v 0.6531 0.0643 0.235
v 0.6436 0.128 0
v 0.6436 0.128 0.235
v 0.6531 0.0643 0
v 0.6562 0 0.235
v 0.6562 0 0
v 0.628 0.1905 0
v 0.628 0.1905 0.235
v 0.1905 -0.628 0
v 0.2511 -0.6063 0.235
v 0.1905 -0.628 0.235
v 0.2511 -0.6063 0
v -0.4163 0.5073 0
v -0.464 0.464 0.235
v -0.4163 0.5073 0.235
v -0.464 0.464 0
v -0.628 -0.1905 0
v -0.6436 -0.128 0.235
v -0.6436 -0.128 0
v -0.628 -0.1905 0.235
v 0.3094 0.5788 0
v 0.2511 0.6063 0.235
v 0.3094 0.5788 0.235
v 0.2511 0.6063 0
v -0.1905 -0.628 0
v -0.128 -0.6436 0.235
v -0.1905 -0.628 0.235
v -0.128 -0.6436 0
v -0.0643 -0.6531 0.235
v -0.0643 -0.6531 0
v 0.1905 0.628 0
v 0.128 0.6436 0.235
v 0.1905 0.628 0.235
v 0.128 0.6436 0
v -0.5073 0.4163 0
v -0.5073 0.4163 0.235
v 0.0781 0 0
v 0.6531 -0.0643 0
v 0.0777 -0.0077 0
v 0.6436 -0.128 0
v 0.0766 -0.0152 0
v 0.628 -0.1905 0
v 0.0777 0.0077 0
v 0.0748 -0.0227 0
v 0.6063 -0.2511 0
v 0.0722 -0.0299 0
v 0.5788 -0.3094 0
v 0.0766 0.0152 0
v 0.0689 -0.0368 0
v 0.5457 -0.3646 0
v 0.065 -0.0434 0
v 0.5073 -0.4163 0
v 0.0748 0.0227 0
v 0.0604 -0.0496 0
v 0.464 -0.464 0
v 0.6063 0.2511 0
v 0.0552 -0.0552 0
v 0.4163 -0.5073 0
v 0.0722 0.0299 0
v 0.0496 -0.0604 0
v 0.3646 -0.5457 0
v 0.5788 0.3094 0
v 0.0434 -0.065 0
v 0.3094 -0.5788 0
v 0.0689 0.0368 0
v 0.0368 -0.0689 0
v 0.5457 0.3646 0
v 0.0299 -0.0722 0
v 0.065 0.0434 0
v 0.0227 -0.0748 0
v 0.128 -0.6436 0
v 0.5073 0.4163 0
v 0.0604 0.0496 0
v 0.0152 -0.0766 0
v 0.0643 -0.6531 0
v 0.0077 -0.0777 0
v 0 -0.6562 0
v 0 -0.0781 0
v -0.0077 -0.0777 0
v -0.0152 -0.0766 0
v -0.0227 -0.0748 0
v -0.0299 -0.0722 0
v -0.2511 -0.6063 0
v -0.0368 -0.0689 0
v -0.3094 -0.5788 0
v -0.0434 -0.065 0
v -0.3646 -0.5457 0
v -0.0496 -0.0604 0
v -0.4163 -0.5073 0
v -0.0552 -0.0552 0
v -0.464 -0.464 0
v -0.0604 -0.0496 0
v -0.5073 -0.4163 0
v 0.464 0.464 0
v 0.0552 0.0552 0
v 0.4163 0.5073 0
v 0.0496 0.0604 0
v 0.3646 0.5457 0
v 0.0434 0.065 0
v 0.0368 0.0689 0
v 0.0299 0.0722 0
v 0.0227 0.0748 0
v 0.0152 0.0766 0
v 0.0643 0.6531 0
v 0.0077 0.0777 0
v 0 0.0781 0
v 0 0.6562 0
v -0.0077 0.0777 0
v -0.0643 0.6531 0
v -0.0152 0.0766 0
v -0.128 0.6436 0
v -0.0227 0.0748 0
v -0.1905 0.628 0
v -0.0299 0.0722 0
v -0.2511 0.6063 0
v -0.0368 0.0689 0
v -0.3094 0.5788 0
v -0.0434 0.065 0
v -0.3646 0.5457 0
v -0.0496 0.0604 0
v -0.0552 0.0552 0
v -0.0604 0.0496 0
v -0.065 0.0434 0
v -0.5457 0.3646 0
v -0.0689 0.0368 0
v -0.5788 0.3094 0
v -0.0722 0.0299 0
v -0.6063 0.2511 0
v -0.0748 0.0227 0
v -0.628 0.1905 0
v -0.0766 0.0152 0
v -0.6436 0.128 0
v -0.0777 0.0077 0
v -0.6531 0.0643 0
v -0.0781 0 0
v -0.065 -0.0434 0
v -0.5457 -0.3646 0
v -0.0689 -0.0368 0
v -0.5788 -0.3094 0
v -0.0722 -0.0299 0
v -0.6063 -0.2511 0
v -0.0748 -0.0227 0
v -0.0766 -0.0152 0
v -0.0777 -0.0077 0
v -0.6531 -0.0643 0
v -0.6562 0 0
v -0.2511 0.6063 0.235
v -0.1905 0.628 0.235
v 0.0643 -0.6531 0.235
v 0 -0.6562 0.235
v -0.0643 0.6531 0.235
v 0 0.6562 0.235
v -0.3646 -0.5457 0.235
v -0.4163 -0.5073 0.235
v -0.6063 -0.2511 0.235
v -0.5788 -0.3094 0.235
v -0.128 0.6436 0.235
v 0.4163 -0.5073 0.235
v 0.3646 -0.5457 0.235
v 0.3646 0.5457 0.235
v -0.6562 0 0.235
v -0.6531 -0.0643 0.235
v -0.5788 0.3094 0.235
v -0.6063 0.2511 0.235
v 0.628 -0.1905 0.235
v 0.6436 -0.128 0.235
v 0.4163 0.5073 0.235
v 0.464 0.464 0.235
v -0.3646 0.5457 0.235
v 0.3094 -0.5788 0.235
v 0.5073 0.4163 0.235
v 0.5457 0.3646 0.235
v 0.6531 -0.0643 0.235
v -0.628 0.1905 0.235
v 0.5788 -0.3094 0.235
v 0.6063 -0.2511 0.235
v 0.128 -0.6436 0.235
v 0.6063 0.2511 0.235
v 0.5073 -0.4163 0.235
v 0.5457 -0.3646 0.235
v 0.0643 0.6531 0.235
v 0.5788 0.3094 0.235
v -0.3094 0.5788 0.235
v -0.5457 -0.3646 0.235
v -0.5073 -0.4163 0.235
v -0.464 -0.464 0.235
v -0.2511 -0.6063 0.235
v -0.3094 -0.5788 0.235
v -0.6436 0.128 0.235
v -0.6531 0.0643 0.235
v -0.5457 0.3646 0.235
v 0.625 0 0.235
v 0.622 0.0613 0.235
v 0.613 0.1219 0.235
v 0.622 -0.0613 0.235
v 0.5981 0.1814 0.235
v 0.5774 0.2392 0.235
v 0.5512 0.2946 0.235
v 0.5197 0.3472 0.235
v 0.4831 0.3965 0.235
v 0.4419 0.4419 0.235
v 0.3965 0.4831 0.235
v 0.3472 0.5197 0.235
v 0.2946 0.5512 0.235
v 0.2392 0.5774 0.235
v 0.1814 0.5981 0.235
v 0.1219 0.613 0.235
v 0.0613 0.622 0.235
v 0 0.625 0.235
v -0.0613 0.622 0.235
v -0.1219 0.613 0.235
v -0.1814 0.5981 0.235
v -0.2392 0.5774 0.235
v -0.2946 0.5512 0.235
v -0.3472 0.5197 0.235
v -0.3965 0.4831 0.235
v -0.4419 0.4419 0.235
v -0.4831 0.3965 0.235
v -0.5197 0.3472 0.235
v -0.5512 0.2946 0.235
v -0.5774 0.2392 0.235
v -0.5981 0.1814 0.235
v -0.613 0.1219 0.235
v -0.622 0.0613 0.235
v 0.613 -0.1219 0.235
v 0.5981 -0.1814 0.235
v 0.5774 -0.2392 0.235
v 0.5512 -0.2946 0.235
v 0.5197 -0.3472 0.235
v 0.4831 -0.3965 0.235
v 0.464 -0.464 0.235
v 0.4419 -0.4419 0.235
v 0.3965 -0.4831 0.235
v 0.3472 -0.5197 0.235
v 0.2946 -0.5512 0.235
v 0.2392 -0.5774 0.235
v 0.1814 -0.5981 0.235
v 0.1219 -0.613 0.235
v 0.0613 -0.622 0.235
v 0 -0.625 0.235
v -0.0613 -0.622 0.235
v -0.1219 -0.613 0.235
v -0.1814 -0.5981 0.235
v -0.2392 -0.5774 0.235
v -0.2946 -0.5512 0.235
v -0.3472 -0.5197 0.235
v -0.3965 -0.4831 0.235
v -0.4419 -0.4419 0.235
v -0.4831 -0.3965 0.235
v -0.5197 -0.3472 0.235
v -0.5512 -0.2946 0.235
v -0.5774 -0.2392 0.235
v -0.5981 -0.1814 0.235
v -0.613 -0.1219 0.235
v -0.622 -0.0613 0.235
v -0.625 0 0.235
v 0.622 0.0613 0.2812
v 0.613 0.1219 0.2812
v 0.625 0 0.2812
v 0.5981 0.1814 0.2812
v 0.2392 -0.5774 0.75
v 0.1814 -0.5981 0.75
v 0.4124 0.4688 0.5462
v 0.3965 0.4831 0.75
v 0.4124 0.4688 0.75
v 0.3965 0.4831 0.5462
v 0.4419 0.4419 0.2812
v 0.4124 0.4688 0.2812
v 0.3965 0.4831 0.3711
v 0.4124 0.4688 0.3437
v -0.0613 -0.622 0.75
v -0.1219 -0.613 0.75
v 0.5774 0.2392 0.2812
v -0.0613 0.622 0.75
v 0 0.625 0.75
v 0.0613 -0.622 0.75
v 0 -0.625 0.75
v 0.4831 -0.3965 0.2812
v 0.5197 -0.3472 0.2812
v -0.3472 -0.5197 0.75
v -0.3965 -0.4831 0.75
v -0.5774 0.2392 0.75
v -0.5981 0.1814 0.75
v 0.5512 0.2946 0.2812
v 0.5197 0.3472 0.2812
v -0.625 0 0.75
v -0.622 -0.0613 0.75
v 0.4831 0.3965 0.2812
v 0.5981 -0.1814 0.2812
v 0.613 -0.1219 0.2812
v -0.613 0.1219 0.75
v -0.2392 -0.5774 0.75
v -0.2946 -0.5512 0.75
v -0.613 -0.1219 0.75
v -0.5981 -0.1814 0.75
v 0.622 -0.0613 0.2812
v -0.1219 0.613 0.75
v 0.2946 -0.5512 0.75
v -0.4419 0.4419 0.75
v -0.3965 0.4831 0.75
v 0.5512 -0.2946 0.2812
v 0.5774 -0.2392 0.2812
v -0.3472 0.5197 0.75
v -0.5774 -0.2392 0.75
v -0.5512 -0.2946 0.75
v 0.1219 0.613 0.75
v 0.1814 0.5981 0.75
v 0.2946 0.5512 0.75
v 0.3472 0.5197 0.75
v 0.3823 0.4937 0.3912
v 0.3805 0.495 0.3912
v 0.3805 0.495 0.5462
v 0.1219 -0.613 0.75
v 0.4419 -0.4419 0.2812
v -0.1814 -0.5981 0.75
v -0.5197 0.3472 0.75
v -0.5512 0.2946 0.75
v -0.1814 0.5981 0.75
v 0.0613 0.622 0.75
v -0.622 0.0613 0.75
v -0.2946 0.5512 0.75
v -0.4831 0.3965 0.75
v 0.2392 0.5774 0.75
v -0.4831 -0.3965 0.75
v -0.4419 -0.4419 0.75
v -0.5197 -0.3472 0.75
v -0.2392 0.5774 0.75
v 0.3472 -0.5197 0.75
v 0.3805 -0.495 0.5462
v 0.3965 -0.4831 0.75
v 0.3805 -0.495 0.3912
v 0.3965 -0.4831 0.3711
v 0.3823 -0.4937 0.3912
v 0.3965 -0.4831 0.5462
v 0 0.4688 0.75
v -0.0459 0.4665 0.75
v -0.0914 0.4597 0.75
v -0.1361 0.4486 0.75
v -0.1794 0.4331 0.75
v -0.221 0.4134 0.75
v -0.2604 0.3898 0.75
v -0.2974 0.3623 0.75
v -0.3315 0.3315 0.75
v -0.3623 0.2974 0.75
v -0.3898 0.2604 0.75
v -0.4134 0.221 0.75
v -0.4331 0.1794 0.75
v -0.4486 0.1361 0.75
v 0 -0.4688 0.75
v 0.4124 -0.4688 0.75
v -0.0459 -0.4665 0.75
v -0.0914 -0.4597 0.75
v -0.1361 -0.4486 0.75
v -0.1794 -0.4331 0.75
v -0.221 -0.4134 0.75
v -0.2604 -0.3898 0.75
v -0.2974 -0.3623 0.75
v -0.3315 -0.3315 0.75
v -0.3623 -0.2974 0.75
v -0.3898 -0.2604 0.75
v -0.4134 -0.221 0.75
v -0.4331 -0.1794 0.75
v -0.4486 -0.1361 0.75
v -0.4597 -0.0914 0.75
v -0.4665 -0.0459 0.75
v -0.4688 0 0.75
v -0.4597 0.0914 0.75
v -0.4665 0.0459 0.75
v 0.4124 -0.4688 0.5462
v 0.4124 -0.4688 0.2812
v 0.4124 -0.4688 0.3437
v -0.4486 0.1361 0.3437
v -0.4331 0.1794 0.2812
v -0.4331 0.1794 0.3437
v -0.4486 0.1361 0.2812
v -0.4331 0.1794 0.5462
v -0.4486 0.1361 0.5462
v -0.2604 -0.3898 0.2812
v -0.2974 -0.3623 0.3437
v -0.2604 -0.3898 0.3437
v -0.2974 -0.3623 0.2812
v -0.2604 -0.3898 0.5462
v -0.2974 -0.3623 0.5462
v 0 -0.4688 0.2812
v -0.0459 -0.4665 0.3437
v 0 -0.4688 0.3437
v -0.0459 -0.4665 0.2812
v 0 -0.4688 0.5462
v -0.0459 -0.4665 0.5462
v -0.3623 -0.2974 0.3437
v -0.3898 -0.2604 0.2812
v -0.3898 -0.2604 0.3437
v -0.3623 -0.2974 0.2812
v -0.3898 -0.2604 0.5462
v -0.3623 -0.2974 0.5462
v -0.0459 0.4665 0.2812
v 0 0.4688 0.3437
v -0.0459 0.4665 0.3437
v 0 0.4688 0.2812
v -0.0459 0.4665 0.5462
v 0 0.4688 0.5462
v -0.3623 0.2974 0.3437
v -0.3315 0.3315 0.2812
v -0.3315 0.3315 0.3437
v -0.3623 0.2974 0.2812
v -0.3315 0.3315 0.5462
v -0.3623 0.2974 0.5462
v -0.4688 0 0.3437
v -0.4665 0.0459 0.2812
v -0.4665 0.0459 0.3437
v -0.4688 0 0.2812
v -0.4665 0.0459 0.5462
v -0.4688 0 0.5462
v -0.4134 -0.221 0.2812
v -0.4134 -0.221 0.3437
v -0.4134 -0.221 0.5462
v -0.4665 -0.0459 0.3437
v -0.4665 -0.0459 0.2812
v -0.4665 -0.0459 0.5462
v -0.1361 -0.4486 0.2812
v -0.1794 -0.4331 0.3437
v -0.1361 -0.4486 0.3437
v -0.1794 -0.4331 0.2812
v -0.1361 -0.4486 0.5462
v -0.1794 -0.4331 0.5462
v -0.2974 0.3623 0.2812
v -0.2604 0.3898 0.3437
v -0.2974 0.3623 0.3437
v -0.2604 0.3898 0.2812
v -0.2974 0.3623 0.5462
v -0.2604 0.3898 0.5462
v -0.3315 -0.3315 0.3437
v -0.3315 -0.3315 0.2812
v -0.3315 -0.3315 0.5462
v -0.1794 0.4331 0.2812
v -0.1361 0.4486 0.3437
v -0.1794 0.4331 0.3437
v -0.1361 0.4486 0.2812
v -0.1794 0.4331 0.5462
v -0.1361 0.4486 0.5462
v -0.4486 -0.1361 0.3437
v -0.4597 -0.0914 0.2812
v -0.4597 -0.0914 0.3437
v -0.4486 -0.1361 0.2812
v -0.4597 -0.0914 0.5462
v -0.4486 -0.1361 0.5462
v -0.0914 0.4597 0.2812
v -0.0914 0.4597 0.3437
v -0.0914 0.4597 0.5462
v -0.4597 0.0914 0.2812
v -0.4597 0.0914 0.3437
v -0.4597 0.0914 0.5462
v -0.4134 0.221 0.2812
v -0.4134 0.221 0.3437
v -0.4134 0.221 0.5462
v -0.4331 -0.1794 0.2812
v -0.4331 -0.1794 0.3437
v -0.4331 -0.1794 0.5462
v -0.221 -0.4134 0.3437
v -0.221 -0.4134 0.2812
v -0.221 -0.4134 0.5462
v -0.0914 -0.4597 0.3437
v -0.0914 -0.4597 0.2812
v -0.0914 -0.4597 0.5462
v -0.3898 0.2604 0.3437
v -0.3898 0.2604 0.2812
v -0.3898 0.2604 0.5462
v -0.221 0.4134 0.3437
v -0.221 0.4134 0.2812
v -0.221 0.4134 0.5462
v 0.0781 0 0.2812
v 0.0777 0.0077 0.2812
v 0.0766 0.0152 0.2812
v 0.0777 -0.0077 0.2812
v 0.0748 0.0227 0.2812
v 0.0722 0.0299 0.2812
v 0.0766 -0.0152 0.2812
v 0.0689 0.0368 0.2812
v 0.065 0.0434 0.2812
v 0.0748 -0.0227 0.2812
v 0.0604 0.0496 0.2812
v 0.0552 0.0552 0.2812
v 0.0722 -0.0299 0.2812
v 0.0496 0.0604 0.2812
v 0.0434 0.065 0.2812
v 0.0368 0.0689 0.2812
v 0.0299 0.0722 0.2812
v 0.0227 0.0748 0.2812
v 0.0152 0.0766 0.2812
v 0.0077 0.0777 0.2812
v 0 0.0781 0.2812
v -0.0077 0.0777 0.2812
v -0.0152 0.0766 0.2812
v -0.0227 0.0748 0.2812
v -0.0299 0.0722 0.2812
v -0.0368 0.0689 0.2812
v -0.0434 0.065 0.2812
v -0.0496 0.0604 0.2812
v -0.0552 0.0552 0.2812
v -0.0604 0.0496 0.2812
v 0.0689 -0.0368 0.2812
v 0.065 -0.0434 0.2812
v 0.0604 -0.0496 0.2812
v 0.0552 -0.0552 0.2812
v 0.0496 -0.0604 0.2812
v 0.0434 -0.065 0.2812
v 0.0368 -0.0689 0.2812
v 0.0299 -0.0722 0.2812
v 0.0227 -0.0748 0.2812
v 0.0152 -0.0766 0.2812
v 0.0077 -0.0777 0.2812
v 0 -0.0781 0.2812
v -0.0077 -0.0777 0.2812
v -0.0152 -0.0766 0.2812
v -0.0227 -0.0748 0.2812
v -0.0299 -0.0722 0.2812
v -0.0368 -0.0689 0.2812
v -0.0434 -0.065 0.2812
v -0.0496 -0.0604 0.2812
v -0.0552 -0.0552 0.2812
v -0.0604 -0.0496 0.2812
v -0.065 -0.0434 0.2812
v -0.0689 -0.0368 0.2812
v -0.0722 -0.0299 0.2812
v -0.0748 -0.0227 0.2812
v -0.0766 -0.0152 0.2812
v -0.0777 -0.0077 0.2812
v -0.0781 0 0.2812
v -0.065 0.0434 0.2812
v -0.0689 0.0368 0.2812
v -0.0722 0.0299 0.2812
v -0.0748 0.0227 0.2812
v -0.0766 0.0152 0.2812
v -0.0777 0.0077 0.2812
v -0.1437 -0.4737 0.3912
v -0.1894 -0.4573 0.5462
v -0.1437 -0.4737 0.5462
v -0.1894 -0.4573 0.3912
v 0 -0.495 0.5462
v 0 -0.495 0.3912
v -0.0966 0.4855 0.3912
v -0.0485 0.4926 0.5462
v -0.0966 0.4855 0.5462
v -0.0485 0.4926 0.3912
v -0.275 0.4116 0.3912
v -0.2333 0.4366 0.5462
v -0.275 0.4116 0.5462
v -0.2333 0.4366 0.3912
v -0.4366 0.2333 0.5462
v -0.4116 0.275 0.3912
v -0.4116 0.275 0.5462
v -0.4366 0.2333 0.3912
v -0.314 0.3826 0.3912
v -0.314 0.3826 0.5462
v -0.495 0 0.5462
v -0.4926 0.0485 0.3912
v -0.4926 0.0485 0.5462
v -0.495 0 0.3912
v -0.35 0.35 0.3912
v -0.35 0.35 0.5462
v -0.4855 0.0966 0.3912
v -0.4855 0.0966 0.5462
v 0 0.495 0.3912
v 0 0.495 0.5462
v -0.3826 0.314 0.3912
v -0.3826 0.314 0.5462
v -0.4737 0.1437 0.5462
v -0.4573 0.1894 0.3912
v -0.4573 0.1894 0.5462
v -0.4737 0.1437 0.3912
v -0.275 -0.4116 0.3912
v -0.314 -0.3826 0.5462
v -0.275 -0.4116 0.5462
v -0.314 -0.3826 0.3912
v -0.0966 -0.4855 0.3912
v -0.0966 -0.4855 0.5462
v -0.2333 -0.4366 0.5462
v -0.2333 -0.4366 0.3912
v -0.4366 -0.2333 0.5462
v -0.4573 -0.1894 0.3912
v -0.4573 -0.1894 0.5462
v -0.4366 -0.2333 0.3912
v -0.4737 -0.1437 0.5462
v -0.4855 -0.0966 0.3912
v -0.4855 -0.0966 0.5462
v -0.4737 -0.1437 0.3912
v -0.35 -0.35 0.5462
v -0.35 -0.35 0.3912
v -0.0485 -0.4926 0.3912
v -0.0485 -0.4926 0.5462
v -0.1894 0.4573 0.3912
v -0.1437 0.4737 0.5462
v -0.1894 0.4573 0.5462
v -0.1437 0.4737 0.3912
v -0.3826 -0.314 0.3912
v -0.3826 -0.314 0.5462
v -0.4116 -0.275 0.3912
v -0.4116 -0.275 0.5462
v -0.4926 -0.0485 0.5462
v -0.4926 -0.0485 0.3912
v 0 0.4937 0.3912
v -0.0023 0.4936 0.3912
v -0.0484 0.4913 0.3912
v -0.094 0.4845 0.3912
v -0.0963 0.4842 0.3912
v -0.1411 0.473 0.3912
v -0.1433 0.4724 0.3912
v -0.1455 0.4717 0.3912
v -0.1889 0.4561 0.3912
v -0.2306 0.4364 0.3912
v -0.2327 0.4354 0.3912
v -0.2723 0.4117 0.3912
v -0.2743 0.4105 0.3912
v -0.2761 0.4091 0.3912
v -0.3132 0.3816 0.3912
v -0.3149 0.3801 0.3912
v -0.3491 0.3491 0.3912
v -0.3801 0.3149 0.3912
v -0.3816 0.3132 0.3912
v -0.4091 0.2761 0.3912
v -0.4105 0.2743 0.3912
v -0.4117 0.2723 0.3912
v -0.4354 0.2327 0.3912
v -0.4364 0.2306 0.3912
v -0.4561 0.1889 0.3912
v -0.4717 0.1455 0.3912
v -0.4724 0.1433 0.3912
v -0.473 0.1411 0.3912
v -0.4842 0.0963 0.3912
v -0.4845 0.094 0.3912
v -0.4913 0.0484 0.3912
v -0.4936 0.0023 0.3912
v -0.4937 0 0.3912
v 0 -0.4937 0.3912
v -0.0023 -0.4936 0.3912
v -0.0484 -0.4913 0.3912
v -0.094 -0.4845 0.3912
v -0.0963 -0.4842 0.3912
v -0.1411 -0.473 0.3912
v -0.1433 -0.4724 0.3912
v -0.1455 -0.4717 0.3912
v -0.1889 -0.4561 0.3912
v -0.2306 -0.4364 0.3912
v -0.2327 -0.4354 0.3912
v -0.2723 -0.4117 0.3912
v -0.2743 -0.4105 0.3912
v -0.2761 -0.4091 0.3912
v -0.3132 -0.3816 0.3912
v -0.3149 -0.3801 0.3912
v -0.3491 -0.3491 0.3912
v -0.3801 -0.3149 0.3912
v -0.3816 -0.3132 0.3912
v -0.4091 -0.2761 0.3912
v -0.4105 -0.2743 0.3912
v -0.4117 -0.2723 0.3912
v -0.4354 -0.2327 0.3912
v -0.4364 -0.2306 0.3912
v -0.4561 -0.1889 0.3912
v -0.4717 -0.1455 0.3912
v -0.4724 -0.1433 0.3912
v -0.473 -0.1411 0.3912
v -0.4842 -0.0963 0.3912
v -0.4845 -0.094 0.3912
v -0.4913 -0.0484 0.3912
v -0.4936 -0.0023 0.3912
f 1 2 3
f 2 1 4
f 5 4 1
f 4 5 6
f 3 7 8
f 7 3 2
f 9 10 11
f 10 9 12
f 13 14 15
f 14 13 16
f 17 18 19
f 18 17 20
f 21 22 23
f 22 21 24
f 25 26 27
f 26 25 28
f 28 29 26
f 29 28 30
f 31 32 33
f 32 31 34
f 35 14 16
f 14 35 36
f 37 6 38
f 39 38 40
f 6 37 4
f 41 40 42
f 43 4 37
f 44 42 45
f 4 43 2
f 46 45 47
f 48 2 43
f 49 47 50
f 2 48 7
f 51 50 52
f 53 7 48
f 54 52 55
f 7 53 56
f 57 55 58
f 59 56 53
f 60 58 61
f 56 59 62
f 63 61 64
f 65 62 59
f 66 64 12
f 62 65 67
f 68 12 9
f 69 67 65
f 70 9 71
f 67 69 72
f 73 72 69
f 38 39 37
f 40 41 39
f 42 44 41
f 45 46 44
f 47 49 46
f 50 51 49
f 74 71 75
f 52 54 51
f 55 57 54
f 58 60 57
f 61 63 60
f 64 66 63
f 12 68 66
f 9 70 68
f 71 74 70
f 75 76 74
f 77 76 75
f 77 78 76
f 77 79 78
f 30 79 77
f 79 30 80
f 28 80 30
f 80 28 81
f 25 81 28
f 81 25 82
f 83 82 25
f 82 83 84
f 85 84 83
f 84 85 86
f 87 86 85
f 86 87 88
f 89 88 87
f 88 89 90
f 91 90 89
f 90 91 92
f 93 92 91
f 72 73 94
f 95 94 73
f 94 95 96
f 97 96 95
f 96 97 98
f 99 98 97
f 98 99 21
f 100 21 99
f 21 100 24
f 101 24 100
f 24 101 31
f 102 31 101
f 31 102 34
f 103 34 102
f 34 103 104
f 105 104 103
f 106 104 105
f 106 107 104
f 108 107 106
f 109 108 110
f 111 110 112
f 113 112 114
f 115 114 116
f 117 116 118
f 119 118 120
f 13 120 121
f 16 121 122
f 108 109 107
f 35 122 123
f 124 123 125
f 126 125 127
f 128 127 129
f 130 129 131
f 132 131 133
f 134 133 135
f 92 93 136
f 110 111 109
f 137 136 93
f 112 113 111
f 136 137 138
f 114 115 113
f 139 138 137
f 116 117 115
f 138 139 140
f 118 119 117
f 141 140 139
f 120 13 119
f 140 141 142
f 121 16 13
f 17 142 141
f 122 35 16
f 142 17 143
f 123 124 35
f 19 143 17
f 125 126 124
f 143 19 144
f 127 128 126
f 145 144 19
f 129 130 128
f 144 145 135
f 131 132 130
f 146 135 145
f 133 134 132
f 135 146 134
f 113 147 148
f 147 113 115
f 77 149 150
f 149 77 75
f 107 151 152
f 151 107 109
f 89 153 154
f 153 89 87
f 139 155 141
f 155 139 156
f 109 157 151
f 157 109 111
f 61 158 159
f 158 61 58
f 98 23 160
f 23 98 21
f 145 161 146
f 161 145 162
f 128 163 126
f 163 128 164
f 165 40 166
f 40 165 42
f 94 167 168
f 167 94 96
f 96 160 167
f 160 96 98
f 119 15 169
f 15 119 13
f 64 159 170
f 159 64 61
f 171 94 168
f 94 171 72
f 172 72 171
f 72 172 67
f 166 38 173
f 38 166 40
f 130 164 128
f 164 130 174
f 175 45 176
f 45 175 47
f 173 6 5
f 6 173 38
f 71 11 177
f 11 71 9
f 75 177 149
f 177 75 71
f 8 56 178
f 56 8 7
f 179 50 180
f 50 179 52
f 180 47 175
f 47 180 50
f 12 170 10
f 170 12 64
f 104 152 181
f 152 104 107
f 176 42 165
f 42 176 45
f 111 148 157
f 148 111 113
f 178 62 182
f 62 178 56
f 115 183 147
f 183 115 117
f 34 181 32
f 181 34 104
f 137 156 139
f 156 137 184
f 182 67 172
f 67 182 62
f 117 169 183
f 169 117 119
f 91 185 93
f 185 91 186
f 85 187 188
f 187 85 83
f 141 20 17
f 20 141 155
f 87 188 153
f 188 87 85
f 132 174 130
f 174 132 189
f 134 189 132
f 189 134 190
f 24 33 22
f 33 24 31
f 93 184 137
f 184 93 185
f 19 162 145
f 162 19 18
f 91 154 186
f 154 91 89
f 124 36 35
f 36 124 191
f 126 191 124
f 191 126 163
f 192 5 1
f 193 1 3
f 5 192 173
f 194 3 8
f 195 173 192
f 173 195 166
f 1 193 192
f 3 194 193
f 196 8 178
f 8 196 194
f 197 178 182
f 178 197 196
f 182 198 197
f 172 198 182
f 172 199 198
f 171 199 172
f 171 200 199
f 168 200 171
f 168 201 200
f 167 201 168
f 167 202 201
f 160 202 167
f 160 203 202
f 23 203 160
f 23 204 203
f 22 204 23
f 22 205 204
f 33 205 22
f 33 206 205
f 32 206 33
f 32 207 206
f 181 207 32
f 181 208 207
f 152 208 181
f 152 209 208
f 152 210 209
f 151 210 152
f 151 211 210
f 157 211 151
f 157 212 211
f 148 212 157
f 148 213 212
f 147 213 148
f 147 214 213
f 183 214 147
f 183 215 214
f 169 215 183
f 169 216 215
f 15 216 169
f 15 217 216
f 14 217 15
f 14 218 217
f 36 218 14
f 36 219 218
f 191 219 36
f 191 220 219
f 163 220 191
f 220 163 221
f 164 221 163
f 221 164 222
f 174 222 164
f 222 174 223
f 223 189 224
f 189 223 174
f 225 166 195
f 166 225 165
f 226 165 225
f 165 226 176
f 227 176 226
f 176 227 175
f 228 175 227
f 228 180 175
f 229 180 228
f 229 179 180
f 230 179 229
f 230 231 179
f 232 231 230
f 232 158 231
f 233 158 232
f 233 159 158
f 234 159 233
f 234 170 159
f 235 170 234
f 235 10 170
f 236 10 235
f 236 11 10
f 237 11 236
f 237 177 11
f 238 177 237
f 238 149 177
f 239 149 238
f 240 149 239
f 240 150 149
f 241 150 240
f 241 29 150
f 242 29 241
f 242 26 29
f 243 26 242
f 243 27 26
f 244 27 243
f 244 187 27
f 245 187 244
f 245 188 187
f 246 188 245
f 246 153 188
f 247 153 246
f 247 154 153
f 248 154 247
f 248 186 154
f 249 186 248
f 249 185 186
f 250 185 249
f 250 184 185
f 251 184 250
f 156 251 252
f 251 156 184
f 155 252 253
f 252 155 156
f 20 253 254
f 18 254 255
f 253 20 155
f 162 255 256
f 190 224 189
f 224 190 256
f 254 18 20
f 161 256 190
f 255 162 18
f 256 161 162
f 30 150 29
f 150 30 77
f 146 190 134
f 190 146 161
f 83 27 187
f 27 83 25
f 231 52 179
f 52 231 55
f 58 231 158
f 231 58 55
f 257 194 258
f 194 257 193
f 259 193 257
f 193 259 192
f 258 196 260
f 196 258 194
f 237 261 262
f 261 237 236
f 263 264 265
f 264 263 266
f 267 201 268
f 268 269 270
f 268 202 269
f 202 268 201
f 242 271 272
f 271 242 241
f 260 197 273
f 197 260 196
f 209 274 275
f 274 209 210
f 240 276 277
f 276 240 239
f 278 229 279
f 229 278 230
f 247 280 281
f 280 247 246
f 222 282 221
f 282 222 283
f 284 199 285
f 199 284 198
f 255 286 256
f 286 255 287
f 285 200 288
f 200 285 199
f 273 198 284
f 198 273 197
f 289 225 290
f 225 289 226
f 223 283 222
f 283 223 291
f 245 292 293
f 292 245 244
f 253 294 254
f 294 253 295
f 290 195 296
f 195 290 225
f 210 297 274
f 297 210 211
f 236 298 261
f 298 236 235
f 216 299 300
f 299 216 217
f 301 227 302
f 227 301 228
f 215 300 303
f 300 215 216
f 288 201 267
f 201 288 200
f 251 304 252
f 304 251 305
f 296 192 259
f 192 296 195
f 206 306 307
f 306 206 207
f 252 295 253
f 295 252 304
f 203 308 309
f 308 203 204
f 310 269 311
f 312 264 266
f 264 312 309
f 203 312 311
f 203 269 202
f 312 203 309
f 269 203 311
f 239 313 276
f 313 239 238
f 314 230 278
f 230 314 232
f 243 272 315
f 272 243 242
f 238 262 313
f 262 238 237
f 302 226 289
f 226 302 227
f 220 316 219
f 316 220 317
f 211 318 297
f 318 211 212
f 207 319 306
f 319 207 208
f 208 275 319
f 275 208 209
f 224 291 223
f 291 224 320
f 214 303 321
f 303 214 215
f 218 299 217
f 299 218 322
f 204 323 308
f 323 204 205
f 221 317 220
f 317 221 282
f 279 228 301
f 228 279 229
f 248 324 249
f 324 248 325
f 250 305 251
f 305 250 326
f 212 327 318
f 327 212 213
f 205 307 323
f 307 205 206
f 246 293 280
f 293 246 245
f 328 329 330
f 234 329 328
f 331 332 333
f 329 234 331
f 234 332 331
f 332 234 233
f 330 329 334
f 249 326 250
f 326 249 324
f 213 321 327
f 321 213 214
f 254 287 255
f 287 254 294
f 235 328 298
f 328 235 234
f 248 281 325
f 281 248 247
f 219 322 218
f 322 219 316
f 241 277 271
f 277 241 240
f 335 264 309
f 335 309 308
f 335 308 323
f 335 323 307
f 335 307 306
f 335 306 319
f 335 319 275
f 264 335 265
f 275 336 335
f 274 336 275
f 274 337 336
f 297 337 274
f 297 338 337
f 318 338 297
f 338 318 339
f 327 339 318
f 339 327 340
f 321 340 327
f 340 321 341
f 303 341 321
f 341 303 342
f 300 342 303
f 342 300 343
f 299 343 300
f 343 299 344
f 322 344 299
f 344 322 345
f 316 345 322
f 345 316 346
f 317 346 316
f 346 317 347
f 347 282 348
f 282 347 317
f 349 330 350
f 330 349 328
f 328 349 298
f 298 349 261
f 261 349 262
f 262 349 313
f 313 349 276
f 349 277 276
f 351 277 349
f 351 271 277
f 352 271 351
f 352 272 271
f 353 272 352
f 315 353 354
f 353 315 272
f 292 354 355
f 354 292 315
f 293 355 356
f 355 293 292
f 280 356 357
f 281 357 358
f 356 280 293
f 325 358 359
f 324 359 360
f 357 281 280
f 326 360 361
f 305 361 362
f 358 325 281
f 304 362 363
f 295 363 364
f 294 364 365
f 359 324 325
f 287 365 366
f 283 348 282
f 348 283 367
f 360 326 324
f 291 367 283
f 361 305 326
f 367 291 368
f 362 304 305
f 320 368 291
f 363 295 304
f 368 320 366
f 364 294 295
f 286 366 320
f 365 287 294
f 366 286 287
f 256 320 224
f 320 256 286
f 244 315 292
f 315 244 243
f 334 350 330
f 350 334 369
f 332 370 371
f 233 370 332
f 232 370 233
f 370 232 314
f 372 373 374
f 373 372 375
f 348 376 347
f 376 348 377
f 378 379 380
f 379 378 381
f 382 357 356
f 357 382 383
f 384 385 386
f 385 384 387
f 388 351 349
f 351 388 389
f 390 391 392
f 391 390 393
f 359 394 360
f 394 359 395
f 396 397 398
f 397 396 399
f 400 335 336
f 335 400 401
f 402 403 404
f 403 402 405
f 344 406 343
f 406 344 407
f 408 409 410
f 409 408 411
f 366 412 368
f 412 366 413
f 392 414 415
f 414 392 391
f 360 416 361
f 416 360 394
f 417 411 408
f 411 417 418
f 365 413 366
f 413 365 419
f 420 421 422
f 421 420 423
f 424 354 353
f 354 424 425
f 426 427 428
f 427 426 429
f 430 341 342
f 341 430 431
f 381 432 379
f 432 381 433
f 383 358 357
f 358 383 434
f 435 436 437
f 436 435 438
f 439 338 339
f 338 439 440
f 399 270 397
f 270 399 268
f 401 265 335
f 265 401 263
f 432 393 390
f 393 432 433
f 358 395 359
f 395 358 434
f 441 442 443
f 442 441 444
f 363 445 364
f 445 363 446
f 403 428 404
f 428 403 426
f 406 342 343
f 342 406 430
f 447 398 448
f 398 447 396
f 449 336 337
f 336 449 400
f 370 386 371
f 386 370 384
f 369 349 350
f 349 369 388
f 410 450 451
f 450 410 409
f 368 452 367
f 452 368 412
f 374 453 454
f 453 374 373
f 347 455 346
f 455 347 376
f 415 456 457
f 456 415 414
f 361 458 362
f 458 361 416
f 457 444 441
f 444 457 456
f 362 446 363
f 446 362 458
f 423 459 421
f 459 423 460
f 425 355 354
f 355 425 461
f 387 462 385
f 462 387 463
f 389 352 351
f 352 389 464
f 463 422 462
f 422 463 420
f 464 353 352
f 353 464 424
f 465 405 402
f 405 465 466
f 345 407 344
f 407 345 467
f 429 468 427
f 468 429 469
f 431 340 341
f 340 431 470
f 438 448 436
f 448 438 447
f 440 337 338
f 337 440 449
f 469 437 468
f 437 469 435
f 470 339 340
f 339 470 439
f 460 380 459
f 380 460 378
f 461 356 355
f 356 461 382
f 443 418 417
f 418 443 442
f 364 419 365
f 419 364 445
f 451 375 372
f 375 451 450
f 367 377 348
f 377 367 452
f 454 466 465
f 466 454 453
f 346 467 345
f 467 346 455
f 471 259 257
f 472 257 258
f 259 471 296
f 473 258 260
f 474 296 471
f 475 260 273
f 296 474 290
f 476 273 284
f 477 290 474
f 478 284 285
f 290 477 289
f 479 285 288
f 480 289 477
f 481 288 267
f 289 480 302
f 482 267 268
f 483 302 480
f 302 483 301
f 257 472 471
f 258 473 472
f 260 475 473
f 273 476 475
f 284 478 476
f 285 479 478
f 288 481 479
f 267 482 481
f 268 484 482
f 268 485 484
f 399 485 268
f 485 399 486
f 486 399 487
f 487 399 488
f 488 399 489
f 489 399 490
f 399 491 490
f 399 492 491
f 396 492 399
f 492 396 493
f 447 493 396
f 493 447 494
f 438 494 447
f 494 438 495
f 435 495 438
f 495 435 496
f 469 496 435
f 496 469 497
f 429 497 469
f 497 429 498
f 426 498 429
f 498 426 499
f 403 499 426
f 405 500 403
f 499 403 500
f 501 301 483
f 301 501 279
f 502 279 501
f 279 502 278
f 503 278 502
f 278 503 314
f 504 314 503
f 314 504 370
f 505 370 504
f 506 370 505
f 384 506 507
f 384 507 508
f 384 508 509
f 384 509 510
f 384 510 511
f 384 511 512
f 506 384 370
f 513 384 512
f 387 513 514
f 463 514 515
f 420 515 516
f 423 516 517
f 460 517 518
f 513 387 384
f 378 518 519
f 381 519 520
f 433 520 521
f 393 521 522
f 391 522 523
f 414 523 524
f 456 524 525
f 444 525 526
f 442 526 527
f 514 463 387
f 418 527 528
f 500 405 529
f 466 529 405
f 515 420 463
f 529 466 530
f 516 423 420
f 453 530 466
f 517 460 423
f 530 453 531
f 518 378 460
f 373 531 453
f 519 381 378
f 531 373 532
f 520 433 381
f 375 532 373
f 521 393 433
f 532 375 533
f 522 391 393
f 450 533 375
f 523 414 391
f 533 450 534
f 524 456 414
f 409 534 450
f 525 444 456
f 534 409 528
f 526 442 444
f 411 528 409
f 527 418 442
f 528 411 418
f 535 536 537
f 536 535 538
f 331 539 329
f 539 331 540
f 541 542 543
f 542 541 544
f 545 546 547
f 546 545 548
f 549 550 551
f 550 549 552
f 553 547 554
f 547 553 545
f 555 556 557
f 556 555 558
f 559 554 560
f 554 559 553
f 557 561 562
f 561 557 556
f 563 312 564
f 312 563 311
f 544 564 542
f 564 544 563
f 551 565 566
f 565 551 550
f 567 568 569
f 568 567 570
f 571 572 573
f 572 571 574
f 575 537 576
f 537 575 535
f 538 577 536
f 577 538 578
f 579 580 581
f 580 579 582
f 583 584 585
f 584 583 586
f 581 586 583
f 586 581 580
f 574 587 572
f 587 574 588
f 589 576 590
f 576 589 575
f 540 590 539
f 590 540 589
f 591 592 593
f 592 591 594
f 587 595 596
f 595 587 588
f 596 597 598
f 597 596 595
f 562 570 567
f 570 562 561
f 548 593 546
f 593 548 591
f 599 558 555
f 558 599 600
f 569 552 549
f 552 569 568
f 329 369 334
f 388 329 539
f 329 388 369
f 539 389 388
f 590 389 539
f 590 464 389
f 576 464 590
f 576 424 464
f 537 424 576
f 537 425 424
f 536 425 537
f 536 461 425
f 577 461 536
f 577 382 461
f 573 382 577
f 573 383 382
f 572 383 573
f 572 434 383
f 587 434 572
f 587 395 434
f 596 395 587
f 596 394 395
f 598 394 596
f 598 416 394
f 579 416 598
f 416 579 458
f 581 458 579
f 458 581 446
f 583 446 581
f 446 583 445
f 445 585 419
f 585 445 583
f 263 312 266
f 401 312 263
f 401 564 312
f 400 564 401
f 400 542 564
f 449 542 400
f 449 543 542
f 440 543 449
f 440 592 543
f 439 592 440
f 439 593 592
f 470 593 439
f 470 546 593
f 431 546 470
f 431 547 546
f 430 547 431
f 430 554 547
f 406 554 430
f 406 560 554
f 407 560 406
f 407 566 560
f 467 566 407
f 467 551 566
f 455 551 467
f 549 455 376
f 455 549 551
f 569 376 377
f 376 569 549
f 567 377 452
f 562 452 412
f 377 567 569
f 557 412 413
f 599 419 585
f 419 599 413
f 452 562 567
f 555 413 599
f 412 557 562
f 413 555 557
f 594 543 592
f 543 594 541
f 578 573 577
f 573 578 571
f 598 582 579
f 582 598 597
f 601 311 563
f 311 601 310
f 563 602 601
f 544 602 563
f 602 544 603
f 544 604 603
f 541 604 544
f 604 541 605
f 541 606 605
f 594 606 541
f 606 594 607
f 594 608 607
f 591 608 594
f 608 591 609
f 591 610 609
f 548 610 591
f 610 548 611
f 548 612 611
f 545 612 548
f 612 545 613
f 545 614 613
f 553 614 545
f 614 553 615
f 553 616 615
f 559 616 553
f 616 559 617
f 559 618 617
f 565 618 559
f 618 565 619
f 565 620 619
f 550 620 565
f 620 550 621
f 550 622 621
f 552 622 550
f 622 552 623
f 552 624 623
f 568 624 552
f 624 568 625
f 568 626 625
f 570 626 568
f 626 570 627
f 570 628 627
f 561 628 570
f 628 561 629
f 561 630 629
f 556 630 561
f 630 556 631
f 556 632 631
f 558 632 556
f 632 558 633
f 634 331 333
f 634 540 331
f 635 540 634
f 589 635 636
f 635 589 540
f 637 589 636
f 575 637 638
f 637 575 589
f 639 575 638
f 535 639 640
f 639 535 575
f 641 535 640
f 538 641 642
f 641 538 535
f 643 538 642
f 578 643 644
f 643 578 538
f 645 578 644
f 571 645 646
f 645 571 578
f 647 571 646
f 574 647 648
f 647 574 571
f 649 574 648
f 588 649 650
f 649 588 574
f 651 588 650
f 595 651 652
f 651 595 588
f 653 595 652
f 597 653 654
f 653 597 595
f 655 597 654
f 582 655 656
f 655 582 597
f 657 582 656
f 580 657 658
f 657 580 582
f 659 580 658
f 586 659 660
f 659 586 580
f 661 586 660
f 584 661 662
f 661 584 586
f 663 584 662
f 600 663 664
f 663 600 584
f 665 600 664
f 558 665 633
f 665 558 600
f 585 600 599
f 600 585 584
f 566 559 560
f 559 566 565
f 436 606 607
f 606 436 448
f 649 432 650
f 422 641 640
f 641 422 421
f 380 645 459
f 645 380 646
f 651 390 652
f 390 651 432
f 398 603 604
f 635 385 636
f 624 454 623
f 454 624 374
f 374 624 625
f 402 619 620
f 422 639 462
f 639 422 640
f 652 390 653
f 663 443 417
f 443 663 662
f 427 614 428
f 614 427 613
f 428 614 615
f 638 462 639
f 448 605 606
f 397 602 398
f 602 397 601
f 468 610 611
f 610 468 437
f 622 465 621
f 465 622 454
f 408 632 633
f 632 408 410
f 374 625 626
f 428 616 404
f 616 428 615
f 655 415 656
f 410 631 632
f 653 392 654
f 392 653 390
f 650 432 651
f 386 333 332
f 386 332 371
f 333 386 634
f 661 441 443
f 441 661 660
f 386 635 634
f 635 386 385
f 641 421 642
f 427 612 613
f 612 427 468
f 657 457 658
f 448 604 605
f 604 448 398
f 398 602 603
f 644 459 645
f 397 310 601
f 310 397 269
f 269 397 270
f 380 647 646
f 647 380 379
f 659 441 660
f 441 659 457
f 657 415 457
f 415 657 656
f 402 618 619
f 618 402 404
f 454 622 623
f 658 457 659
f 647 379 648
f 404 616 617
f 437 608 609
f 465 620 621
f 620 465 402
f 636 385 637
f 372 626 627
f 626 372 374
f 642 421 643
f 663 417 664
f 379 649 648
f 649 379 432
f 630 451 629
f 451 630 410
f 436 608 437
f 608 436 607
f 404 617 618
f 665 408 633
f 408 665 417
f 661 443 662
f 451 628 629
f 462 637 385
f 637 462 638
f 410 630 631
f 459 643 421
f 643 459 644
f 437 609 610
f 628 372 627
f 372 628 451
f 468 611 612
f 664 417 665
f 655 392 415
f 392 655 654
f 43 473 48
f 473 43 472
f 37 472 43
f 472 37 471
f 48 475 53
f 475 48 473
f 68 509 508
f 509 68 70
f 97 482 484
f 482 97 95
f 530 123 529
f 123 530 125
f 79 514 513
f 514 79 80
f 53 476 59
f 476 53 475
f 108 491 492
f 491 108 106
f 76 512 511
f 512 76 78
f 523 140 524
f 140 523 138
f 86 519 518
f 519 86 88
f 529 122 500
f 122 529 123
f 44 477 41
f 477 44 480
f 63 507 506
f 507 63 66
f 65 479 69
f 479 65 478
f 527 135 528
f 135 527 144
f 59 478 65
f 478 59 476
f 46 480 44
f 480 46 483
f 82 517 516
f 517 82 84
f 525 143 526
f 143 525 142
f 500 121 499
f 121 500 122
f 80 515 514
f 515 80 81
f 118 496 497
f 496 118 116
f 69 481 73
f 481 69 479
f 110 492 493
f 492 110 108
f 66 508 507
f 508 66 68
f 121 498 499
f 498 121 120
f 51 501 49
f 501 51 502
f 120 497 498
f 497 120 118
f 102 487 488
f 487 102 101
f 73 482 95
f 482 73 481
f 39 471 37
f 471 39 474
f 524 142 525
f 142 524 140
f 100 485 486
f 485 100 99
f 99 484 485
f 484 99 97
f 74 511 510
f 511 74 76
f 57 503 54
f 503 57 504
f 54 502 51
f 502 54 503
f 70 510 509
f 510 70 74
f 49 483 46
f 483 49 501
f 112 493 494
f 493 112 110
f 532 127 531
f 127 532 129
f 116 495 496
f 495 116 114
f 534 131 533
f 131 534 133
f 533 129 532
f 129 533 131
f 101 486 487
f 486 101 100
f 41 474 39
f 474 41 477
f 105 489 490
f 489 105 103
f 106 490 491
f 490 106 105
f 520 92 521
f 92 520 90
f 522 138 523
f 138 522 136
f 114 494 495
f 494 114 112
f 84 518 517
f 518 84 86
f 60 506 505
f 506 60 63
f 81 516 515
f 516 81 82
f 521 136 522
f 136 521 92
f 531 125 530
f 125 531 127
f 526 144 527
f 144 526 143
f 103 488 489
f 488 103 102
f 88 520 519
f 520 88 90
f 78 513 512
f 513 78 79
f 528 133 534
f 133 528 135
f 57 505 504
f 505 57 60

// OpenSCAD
$fn=64;

headspace=9/32;

difference() {
    union() {
        // base
        cylinder(r=(1+5/16) /2, h=1/4-0.015);

        // shell holder
        cylinder(r=(1+1/4) /2, h=3/4);
    }

    // belt recess
    translate([0, 0, headspace]) {
        adapter_diameter=15/16;
        adapter_height=3/8;
        taper_height=1/8;
        hull() {
            cylinder(r=adapter_diameter/2, h=adapter_height+taper_height);
            translate([2, 0, 0])
                cylinder(r=adapter_diameter/2, h=adapter_height+taper_height);
        }

        belt_height=1/8+0.030;
        belt_diameter=adapter_diameter+0.0525;
        translate([0, 0, adapter_height/2]) hull() {
            cylinder(r=belt_diameter/2, h=belt_height, center=true);
            translate([2, 0, 0]) cylinder(r=belt_diameter/2, h=belt_height, center=true);
        }

        // overhang chamfer
        translate([0, 0, adapter_height/2 - 0.1]) hull() {
            cylinder(r1=adapter_diameter/2, r2=belt_diameter/2, h=0.050, center=true);
            translate([2, 0, 0]) cylinder(r1=adapter_diameter/2, r2=belt_diameter/2, h=0.050, center=true);
        }
    }

    // firing pin hole
    cylinder(r=5/32 /2, h=1);
}
